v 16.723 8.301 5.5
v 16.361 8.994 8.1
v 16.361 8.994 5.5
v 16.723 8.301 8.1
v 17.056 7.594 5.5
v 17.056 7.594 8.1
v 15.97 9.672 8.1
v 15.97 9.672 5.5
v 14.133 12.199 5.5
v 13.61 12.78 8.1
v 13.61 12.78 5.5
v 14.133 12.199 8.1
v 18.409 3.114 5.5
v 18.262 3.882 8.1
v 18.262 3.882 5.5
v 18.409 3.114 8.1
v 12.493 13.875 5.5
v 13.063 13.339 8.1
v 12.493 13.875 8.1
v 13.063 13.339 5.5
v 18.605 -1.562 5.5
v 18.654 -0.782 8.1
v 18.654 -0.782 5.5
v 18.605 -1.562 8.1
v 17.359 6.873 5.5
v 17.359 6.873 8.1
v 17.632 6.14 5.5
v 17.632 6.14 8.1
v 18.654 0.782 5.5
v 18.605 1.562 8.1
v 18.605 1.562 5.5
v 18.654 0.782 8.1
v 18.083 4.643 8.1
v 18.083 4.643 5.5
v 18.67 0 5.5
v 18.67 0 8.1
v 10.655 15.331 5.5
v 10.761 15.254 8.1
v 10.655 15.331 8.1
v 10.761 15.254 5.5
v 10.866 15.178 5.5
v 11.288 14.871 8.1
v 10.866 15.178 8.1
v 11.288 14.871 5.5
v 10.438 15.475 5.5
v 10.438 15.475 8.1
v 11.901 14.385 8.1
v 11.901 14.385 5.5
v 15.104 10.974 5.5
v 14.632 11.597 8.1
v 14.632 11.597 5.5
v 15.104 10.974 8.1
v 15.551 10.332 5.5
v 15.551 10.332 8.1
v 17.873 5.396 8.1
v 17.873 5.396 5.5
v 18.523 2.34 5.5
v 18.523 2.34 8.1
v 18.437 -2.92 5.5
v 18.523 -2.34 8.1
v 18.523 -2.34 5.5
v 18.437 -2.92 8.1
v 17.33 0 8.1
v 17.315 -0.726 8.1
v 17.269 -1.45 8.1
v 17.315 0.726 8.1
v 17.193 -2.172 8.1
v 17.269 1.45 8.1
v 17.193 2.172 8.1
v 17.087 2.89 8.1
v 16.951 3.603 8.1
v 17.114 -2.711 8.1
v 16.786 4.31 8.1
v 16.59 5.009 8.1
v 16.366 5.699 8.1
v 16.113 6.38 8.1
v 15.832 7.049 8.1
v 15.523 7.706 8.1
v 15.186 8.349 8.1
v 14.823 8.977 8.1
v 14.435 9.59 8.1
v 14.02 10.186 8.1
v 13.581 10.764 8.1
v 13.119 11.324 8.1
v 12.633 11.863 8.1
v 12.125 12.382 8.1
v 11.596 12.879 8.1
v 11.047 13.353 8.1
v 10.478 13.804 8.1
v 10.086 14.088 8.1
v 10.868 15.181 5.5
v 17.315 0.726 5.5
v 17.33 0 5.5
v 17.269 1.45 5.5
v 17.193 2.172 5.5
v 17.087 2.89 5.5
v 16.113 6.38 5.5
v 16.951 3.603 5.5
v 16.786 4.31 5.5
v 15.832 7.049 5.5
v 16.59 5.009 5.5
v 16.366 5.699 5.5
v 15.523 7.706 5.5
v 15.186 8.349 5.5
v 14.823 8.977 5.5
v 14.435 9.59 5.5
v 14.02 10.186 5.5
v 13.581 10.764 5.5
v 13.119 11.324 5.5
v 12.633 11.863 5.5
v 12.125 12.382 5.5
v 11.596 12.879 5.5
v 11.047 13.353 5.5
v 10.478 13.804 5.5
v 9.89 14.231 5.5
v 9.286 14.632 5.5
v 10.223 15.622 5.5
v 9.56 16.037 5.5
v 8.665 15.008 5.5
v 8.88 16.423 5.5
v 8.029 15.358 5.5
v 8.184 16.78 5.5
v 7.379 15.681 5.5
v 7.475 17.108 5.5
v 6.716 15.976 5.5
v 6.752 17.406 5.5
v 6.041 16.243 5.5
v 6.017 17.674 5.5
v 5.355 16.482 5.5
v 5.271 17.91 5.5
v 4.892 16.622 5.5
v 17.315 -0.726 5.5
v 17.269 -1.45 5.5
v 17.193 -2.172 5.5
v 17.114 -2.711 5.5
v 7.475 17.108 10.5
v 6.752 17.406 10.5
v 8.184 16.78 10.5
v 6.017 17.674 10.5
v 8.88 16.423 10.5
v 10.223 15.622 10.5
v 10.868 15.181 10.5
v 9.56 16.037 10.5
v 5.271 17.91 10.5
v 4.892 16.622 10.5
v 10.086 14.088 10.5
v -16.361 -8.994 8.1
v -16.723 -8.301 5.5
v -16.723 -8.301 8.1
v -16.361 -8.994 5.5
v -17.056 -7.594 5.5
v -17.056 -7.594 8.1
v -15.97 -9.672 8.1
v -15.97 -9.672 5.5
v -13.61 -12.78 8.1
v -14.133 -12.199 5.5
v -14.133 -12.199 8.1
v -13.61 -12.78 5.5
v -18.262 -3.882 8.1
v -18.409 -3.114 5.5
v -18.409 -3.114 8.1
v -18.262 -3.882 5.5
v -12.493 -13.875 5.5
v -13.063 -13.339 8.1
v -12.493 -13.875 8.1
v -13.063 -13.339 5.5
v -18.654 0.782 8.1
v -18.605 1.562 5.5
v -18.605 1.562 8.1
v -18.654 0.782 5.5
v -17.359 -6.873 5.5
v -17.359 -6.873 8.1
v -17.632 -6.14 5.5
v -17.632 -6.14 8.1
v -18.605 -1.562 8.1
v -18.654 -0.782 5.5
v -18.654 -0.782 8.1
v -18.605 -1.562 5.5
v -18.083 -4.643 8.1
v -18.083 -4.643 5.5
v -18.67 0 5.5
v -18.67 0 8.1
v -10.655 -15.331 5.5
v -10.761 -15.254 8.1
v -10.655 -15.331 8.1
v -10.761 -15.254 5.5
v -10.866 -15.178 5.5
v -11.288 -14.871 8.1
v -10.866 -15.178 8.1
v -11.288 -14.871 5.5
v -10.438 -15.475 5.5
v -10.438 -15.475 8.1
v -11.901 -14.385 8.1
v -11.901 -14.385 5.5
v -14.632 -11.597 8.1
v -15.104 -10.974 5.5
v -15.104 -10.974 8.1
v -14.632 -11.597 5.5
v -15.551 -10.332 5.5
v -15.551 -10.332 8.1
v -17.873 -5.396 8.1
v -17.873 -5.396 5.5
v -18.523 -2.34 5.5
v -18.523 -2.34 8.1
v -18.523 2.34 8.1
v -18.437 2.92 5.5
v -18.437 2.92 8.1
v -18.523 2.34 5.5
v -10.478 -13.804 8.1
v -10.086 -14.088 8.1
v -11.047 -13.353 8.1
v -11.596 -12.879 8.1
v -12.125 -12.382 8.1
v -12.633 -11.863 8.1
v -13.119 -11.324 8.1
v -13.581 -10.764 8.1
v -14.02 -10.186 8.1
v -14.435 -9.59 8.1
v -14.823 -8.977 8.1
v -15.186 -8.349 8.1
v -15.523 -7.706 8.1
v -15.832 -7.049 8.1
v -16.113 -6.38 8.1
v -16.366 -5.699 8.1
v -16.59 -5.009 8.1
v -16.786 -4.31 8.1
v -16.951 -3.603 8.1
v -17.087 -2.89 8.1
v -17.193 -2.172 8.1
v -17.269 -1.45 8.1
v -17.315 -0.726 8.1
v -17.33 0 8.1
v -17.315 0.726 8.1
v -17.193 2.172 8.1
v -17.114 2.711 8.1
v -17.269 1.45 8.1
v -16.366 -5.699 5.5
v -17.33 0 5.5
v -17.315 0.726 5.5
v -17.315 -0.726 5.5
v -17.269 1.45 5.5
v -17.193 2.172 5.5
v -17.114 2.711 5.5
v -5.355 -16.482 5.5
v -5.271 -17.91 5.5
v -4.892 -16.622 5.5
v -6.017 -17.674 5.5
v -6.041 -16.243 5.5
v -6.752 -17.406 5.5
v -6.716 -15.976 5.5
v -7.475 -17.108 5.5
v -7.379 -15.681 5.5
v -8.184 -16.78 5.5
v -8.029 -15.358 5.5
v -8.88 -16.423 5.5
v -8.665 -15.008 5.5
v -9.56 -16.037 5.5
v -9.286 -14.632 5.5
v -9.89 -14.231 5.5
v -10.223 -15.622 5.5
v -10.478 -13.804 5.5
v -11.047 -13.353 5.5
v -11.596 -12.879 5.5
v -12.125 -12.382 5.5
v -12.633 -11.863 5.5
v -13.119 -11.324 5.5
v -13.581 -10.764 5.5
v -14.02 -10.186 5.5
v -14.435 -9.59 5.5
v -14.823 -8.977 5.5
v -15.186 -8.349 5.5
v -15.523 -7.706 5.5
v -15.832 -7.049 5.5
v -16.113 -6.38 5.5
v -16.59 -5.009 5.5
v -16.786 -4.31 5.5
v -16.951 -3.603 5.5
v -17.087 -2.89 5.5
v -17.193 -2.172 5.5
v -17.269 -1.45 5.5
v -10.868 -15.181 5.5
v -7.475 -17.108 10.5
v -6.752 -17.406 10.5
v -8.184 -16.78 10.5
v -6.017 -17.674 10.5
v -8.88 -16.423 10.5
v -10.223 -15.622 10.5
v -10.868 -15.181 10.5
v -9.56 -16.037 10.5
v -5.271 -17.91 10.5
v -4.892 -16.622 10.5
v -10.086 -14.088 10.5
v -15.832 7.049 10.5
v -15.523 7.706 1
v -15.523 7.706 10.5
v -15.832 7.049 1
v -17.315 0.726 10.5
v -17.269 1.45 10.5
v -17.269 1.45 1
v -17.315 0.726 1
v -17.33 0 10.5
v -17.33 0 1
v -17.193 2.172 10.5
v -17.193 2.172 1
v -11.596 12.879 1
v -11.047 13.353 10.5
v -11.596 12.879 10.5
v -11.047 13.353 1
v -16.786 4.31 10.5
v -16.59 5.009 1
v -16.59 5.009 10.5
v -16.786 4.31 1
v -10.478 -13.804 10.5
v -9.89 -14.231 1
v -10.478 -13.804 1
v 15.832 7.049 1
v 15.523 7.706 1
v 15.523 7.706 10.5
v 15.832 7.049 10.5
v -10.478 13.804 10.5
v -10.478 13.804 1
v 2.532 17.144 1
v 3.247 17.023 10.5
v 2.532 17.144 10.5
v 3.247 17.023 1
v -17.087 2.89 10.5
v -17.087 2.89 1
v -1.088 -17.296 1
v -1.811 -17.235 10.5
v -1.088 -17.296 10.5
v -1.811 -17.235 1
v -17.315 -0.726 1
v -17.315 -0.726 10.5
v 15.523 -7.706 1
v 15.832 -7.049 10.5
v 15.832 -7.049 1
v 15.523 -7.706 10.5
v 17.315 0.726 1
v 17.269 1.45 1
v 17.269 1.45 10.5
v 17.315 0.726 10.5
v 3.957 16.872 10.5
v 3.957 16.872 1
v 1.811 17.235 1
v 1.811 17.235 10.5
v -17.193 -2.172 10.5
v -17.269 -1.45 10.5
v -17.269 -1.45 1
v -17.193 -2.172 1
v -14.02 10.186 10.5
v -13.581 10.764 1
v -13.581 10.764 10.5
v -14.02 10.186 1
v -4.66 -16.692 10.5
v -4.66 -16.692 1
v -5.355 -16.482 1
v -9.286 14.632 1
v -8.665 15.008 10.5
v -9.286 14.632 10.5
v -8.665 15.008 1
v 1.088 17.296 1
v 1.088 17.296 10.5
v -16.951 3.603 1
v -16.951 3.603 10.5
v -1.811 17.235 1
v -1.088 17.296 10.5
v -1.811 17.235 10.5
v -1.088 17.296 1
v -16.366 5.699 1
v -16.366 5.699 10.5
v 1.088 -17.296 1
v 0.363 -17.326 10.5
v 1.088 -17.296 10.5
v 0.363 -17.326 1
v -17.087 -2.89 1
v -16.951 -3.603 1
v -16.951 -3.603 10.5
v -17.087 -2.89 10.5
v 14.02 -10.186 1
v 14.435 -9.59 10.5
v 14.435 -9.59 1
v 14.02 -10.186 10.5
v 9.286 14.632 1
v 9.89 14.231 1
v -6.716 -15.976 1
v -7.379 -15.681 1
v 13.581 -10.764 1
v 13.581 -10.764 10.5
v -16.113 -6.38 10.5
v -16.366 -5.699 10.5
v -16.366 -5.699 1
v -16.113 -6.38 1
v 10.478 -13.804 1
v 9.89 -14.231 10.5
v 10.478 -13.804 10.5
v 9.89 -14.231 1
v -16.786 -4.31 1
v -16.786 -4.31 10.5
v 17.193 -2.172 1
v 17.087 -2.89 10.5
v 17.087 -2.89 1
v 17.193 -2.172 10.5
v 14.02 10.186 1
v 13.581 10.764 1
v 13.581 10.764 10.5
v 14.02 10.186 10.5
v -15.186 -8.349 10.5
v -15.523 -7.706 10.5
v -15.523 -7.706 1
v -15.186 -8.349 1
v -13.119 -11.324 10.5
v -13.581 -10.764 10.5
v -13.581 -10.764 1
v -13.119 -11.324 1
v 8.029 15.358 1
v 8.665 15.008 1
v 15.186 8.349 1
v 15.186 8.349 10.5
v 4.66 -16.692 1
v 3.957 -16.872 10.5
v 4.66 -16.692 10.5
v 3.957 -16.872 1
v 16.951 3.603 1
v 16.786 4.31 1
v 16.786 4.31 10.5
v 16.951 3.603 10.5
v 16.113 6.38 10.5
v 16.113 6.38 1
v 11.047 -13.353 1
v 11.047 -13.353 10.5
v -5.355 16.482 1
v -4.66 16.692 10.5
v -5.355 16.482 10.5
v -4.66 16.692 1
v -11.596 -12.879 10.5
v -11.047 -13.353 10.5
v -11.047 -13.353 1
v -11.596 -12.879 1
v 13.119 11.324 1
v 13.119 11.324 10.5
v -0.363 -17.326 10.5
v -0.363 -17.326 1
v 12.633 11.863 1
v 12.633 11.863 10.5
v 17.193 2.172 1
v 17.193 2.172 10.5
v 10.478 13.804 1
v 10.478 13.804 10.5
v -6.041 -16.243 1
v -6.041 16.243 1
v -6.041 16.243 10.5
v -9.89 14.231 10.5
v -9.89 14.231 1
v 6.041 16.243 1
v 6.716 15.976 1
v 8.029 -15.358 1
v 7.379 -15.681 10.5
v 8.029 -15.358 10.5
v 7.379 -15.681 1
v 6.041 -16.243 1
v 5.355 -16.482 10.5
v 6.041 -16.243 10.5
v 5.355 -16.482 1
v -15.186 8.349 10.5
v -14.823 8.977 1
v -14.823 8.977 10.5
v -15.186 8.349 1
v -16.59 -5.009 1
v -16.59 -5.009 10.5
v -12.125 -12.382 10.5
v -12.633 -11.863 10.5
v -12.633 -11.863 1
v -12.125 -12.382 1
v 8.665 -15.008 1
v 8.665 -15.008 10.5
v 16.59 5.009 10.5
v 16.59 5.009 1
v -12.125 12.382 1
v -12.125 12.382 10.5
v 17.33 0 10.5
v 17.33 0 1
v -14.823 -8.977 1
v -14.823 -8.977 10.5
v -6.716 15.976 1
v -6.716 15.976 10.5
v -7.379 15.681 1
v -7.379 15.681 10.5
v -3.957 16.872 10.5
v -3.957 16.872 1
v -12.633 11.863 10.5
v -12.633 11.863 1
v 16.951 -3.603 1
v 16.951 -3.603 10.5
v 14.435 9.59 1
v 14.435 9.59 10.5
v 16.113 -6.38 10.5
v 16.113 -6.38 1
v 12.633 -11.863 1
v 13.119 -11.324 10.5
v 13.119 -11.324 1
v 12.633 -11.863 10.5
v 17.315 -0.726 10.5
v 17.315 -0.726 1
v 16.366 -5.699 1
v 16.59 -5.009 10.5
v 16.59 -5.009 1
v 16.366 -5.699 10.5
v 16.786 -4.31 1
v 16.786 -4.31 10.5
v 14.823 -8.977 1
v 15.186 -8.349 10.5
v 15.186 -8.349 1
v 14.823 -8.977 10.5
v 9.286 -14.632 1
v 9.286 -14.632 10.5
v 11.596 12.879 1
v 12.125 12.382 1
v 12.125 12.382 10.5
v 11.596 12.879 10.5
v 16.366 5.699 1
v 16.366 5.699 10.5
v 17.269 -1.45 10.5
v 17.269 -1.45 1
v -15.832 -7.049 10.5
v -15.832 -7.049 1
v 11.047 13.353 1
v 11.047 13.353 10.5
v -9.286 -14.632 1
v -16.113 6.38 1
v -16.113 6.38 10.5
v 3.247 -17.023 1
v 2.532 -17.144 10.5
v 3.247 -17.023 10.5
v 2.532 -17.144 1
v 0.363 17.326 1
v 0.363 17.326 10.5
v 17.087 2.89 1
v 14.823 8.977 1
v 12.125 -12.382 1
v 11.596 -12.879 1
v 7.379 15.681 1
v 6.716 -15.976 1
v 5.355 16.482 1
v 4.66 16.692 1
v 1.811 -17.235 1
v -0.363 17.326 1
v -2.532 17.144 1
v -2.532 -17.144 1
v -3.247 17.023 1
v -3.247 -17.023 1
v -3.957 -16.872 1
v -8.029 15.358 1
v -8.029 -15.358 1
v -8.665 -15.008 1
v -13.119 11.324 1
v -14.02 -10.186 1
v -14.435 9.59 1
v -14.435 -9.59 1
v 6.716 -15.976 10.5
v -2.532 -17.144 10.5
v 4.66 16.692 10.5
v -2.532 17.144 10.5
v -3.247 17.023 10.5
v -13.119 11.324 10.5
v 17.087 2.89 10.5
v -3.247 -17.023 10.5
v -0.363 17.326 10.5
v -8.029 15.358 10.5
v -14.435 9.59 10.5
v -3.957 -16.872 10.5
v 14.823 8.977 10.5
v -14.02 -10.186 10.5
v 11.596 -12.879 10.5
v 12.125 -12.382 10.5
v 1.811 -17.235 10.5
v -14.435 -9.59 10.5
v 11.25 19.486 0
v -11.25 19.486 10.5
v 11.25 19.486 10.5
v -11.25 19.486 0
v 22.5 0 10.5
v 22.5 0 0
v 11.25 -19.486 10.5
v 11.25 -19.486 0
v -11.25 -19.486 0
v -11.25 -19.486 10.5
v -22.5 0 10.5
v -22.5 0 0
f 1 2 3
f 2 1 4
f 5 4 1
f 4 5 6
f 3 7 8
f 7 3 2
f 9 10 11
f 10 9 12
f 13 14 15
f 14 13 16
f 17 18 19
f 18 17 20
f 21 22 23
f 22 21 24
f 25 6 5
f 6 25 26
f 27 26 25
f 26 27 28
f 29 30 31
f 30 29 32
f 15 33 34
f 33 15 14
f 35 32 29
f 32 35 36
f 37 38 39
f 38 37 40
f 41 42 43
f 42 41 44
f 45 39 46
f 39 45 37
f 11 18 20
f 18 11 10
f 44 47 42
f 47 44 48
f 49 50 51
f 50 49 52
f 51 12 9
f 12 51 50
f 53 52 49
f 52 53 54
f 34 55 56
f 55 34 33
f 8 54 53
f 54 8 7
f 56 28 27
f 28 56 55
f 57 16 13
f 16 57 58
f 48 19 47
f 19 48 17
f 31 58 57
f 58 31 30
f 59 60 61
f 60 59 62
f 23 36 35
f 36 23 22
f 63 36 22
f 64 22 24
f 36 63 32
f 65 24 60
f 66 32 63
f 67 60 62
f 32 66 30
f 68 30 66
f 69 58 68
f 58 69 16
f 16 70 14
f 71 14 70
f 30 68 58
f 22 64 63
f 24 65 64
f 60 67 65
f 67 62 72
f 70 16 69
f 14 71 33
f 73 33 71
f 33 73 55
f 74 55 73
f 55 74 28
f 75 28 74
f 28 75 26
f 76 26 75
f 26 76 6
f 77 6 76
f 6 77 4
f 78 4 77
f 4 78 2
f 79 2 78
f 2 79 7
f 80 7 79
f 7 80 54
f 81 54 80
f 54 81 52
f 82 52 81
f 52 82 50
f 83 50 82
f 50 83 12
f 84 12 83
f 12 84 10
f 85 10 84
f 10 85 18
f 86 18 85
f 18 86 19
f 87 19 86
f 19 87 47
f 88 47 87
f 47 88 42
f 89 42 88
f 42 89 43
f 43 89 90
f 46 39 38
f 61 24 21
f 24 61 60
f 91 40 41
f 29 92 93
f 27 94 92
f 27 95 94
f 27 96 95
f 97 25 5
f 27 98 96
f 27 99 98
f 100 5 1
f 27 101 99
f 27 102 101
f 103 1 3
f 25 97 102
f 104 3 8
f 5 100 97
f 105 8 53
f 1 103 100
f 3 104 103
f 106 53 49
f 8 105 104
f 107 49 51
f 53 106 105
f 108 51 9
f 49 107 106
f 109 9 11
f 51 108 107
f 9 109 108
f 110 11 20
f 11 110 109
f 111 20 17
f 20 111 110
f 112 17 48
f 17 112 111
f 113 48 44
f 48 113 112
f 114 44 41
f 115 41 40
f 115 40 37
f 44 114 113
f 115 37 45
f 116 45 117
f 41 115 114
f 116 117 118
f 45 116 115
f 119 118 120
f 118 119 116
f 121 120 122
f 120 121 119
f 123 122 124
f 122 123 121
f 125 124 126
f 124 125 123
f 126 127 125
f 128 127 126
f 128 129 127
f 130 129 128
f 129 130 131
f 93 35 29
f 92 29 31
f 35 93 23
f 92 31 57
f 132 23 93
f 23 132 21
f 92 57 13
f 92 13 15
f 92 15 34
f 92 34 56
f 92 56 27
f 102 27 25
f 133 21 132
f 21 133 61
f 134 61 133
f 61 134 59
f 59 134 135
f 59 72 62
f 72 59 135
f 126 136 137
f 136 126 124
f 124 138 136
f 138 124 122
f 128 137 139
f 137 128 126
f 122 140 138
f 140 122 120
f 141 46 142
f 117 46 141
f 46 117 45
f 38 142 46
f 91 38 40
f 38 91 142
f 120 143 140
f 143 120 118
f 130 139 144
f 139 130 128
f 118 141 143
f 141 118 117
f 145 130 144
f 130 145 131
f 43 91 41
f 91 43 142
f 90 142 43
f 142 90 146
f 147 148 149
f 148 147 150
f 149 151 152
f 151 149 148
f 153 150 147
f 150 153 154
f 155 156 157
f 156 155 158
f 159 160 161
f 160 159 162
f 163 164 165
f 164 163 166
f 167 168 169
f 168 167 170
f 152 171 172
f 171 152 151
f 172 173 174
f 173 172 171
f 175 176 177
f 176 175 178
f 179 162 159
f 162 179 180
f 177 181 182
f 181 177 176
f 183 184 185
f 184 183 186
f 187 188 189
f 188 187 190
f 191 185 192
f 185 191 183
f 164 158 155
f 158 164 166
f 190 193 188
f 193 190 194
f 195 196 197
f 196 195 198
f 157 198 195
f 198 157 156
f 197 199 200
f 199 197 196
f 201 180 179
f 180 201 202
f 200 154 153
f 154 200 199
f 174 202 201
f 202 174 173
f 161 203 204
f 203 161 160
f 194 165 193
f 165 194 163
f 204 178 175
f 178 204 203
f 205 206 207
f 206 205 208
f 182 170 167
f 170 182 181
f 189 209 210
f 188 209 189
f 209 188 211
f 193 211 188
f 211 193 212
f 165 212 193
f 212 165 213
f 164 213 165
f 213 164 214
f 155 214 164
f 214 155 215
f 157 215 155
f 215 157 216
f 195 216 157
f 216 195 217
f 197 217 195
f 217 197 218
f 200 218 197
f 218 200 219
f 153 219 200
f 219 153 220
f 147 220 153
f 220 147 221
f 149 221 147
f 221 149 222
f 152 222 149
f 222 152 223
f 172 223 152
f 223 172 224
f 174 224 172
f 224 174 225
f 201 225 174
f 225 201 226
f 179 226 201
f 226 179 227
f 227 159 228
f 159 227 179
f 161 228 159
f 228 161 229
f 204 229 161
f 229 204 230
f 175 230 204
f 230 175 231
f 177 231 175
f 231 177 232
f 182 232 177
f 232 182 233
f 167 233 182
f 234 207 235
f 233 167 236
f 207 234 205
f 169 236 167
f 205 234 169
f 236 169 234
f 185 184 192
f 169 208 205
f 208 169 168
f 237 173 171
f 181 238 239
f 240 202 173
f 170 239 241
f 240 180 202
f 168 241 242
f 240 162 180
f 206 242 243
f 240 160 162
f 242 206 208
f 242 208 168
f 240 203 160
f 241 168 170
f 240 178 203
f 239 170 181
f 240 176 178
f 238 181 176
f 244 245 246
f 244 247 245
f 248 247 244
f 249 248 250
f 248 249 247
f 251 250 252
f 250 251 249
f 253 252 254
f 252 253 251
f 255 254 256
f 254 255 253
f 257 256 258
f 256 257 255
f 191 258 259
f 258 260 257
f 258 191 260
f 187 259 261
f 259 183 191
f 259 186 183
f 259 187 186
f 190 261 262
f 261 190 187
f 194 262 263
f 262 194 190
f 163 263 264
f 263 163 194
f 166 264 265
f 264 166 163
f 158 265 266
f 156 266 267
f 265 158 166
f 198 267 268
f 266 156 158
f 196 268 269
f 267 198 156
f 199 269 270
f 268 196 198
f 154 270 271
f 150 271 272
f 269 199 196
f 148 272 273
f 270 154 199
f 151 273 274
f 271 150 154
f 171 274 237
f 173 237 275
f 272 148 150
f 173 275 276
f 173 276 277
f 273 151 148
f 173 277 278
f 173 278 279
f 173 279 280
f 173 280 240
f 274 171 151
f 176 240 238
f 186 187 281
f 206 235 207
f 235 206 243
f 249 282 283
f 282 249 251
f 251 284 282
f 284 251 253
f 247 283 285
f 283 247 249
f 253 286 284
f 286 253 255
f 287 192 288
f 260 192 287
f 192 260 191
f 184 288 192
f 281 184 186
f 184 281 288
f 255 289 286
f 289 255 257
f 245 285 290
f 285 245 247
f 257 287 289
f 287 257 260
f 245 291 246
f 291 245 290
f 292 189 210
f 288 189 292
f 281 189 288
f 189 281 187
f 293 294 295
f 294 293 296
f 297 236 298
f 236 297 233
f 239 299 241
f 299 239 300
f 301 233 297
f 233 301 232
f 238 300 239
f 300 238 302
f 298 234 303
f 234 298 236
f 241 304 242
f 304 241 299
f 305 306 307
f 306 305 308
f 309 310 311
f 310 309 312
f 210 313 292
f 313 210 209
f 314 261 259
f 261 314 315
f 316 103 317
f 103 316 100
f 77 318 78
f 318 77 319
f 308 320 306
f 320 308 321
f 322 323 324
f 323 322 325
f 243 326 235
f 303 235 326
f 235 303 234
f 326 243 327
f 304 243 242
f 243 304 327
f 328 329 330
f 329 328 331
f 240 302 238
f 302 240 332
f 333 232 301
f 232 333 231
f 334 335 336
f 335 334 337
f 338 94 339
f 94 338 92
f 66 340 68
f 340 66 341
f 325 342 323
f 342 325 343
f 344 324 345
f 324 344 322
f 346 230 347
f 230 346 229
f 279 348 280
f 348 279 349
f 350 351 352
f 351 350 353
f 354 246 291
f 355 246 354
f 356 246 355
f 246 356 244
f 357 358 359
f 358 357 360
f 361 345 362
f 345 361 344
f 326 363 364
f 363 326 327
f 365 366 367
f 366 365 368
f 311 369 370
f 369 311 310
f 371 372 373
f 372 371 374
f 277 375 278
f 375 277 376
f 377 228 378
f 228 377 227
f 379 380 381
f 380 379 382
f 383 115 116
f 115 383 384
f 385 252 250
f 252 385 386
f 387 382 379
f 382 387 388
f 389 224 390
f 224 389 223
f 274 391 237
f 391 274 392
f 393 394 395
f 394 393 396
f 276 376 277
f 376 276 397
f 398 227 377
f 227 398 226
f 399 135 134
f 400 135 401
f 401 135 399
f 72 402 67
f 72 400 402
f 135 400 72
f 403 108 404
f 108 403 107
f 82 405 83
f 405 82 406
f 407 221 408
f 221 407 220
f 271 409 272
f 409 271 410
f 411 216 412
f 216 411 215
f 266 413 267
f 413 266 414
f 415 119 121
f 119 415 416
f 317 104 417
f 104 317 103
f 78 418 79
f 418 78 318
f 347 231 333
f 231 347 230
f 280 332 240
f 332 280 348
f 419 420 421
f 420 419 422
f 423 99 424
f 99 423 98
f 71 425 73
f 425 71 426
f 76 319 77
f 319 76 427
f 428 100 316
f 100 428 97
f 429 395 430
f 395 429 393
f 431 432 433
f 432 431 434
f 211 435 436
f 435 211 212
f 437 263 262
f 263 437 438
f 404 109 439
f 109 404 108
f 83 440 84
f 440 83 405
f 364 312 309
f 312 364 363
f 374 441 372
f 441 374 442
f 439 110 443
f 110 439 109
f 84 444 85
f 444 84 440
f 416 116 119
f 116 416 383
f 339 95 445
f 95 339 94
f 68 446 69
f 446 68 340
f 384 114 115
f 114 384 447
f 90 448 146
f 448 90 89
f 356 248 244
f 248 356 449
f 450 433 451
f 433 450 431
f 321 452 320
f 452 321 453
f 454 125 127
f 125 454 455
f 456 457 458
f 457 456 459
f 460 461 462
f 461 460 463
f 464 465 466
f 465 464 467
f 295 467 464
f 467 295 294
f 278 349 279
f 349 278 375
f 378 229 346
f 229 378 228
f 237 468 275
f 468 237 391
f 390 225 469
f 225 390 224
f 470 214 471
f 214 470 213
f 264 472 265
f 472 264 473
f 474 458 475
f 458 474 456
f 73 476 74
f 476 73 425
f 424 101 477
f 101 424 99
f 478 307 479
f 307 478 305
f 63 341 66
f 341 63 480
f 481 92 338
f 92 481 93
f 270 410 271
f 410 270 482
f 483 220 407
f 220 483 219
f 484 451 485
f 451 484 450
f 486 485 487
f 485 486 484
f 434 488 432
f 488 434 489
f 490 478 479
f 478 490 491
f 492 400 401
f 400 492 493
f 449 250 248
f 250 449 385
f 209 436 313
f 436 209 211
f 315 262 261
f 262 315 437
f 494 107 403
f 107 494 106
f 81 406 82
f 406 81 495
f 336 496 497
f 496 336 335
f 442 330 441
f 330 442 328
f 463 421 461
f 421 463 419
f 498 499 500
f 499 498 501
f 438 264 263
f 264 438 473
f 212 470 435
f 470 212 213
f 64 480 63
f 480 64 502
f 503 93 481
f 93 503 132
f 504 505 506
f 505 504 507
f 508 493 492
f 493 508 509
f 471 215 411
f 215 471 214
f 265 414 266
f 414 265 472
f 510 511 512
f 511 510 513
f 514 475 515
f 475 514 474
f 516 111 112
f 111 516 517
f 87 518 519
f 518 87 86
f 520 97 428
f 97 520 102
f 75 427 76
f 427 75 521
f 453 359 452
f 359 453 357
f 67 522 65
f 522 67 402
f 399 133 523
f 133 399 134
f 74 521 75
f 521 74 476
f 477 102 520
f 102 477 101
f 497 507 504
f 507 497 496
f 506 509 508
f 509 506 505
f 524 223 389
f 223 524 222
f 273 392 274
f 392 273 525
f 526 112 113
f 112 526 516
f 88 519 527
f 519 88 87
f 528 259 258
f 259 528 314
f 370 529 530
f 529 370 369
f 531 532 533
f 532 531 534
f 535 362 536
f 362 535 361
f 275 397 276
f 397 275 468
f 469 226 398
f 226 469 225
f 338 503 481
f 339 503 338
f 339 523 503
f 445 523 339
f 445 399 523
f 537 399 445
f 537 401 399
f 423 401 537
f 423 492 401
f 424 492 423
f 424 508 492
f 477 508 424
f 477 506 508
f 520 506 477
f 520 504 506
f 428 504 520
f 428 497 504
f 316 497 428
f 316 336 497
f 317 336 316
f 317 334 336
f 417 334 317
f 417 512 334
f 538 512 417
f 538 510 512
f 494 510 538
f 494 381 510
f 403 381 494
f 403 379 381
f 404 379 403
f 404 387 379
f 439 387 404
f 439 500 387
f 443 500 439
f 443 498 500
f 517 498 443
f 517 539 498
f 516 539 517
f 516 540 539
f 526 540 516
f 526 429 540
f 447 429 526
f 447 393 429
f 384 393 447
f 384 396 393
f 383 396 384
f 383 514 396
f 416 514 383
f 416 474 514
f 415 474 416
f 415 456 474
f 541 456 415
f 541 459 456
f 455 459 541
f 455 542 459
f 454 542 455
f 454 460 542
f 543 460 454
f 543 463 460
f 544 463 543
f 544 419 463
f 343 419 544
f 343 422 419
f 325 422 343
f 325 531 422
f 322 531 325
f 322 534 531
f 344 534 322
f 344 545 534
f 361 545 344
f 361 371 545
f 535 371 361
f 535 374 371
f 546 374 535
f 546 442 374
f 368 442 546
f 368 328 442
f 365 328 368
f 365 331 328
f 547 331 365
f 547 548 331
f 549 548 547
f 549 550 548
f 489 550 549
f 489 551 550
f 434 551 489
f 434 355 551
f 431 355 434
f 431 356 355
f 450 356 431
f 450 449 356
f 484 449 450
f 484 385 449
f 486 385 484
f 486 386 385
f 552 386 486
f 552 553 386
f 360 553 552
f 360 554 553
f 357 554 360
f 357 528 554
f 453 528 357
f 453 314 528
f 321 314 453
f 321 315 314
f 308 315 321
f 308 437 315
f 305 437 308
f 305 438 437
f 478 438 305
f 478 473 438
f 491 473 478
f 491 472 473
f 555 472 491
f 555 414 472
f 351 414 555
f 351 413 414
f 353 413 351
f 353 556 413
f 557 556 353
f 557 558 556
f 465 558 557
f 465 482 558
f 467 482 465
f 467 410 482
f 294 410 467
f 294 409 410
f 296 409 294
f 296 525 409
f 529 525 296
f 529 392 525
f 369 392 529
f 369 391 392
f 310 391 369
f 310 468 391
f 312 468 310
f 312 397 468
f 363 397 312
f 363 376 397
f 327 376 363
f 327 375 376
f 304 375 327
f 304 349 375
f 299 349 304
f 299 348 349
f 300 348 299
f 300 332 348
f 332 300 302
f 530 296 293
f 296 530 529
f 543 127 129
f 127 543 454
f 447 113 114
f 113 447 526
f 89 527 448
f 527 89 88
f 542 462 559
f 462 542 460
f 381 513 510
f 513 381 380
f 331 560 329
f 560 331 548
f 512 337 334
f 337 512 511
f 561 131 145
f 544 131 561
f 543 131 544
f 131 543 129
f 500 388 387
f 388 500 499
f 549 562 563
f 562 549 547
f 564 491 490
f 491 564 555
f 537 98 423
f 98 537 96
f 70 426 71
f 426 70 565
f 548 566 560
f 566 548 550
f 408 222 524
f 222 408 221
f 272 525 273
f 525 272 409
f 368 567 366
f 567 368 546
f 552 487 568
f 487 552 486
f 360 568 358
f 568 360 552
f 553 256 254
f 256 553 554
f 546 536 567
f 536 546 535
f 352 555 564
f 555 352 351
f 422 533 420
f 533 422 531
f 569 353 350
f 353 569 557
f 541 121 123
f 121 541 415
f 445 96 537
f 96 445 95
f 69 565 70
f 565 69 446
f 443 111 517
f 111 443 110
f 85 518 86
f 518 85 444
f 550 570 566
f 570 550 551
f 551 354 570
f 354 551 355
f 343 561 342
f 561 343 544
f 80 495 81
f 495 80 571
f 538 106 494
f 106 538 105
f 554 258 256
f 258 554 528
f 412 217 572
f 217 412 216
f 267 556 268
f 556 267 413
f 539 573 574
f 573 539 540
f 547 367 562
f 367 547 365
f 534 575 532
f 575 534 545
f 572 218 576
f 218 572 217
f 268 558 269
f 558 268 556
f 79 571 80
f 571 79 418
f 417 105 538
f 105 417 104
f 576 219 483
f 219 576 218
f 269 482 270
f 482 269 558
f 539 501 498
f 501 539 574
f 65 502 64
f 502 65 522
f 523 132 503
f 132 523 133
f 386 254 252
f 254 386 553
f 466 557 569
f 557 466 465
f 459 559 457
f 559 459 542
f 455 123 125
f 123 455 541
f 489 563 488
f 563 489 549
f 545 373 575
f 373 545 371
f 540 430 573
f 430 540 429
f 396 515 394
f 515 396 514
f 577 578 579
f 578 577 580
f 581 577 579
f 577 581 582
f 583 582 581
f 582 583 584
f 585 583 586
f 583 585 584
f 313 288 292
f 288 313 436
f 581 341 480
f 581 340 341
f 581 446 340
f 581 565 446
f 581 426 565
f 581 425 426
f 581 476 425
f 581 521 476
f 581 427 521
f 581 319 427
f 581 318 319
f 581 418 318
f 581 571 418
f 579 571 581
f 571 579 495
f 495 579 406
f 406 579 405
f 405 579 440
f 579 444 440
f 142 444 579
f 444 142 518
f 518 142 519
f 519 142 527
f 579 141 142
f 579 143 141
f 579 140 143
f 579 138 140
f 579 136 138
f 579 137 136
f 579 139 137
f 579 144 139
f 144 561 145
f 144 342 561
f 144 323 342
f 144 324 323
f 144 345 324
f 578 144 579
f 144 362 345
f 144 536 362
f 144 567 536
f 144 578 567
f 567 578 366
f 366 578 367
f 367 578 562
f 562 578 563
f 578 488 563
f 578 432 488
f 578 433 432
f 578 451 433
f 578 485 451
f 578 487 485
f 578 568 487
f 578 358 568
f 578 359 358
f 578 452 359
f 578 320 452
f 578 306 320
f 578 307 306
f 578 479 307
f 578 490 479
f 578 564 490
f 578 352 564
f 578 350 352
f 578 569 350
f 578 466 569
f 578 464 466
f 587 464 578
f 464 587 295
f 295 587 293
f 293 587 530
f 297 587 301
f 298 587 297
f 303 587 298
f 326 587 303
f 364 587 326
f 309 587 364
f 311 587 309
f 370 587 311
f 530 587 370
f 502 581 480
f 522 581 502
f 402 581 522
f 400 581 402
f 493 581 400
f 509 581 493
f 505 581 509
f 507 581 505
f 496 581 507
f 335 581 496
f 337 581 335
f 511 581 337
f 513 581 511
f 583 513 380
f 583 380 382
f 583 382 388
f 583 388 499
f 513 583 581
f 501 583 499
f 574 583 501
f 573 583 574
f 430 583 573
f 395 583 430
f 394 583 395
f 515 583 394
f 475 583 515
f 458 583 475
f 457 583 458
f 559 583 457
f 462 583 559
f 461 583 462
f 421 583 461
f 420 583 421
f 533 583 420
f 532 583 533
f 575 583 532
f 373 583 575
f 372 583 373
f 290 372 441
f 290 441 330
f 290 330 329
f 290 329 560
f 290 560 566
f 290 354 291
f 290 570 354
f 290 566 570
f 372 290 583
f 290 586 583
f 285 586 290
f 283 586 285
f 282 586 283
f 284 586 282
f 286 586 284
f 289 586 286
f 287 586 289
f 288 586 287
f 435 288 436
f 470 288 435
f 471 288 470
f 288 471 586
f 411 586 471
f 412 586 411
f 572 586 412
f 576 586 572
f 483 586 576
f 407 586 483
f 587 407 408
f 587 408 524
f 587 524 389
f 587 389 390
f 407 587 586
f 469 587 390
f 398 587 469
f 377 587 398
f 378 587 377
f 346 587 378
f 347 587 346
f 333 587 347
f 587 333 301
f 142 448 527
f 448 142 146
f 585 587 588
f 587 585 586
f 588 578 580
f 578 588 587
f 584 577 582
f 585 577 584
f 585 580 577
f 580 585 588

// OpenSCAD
module singleWindow(size, length){
    rotate(a=90,v=[0,1,0])
    linear_extrude(height = length)
    circle(size,$fn=6);
}

module windows(size, length,distanceCenter){
    translate([distanceCenter,0,0])
    singleWindow(size, length);

    rotate(a=120,v=[0,0,1])
    translate([distanceCenter,0,0])
    singleWindow(size, length);

    rotate(a=-120,v=[0,0,1])
    translate([distanceCenter,0,0])
    singleWindow(size, length);
}

module outerCase(height, outerDiameter, innerDiameter, lidLip, windows) {
    windowPosition = height / 2;
    difference(){
        union(){
            linear_extrude(height = (height-lidLip))
            circle(outerDiameter,$fn=6);
            cylinder(h = height, r1 = innerDiameter, r2 = innerDiameter);
        }
        if (windows== true){
            translate([0,0,windowPosition])
            rotate(a=90, v=[0,0,1])
            windows(outerDiameter/2.5,  outerDiameter,0);
        }
     }
}

module curvedSegment(innerDiameter, outerDiameter, height, angle){
    difference() {
        difference(){
            cylinder(h=height, r1=outerDiameter, r2=outerDiameter);
            translate([0,0,-0.5])
            cylinder(h=height+1, r1=innerDiameter, r2=innerDiameter);
        }
        union() {
            rotate(a=angle,v=[0,0,1])
            translate([0,0,-1])
            cube([outerDiameter,  outerDiameter,  height+2]);

            rotate(a=180,v=[1,0,0])
            translate([0,0,-(height+1)])
            rotate(a=angle,v=[0,0,1])
            cube([outerDiameter, outerDiameter, height+2]);

            translate([-outerDiameter,-outerDiameter,-1])
            cube([outerDiameter, outerDiameter*2, height+2]);

        }
    }
}

module bayonetHalfChannel(diameter=10, bayonetDistance = 3, bayonetDepth = 1, bayonetWidth=2, bayonetHeight = 2) {
    toleranceFactor = 1.3;
    bayonetWidth=bayonetWidth*toleranceFactor;
    bayonetDepth=bayonetDepth*toleranceFactor;
    bayonetHeight=bayonetHeight*toleranceFactor;
    angle=8;
    channelLength = 4;
    union(){
        offsetCenter = (channelLength -1)* angle;
        rotate(a=offsetCenter , v=[0,0,1])
        curvedSegment(diameter, diameter+bayonetDepth, bayonetHeight, channelLength*angle+1);
        rotate(a=2*channelLength*angle,v=[0,0,1])
        curvedSegment(diameter, diameter+bayonetDepth, bayonetDistance, angle*1.2);

    }

}

module bayonetChannel(diameter, bayonetDistance = 3, bayonetDepth = 1) {
        bayonetOffset = diameter+bayonetDepth;
//        translate([bayonetOffset,0,height - bayonetDistance])
        bayonetHalfChannel(diameter, bayonetDistance, bayonetDepth);
        rotate(a=180,v=[0,0,1])
        bayonetHalfChannel(diameter, bayonetDistance, bayonetDepth);
}

module container(height, diameter , thickness, lidHeight = 5,windows=true, bottomThickness=0.5, lipThickness=1, bayonetDistance = 3, bayonetDepth = 1){
    outerDiameter = diameter + thickness;
    lidDiameter = diameter + 1;
    bayonetDistance = lidHeight- bayonetDistance;
    union(){
        difference(){
            outerCase(height+bottomThickness, outerDiameter,  diameter + lipThickness, lidHeight, windows);
            translate([0,0,bottomThickness])
            cylinder(h = height+1, r1 = diameter, r2 = diameter);
        }
        bayonetPosition = height+bottomThickness + bayonetDistance - lidHeight;
        translate([0,0,bayonetPosition]){
            curvedSegment(diameter, diameter+1+bayonetDepth, 2, 8);
            rotate(a=180,v=[0,0,1])
            curvedSegment(diameter, diameter+1+bayonetDepth, 2, 8);
        }
    }

}

module lid(height, diameter, thickness,, lipTolerance=1.33, lidThickness=0.5, bayonetDistance = 5, bayonetDepth = 2){
    outerDiameter = diameter + thickness;
    innerDiameter = diameter +lipTolerance;

    rotate(a=180, v=[0,1,0])
    translate([0,0,-(height+lidThickness)])
    difference(){
      linear_extrude(height = (height+lidThickness))
      circle(outerDiameter,$fn=6);
        translate([0,0,-(lidThickness)])
        union(){
            cylinder(h = height, r1 = innerDiameter, r2 = innerDiameter);
            rotate(a=180, v=[0,1,0])
            translate([0,0,-bayonetDistance])
            bayonetChannel(innerDiameter-1, bayonetDistance+1,bayonetDepth);
        }
    }
}

$fn=150;
radius= 16;
thickness = 6.5;
//container(height=62, diameter=radius, thickness=thickness, lidHeight=8, bayonetDistance = 5.5, bayonetDepth = 1.4, windows=true);

lid(height=10, diameter=radius, thickness=thickness, bayonetDistance = 5.5, bayonetDepth = 1.8);
